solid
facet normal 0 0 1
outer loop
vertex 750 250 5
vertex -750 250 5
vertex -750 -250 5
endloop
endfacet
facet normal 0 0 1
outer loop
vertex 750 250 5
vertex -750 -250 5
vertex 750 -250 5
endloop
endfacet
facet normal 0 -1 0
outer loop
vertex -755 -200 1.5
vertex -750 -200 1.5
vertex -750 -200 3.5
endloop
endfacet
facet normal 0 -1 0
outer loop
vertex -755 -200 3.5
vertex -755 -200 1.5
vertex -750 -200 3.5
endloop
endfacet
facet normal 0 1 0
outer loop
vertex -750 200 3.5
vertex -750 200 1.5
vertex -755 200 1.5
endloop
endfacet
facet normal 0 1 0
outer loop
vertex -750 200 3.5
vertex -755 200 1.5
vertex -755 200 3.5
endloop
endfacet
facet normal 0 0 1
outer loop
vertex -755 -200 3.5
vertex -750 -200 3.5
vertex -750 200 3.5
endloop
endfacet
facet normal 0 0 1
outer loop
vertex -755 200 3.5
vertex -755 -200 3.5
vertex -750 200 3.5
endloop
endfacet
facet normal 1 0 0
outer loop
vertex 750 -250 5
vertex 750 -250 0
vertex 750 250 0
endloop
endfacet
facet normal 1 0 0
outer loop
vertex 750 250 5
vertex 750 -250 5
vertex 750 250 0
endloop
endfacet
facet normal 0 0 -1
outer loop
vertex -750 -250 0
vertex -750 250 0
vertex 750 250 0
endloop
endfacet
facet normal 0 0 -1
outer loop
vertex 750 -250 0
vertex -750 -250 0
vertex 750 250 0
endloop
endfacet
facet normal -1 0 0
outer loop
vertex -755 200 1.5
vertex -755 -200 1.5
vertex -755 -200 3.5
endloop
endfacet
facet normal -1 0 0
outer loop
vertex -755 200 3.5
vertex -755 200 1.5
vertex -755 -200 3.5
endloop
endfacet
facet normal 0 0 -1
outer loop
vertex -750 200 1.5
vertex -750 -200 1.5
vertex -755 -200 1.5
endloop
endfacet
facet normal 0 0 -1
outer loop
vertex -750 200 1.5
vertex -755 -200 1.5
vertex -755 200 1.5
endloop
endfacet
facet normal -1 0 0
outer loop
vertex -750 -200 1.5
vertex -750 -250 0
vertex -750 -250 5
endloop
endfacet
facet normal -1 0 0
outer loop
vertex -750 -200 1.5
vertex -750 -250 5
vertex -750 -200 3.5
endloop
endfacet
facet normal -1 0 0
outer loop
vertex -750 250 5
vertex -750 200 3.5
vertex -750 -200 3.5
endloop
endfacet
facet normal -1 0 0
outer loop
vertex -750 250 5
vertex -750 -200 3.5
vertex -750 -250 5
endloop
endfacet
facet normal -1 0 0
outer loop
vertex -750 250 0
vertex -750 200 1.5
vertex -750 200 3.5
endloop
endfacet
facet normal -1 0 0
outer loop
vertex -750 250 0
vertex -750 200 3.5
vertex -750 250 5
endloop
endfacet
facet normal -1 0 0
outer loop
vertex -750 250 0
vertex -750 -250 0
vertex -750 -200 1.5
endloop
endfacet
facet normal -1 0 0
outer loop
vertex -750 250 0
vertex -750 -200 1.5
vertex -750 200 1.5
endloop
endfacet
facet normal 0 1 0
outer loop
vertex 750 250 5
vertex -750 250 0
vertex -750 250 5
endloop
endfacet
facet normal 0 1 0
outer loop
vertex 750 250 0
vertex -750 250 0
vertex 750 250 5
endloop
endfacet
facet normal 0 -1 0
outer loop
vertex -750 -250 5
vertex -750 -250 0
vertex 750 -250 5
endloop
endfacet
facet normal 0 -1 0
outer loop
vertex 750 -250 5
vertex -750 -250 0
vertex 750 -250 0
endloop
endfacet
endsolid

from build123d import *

# Parameters (mm, degrees)
SCHIZZO1_W                   = 1500
SCHIZZO1_H                   = 500
ESTRUSIONE_ESTRUSIONE1_DEPTH = 5
SCHIZZO2_W                   = 2
SCHIZZO2_H                   = 400
ESTRUSIONE_ESTRUSIONE2_DEPTH = 5


with BuildPart() as part:
    # Schizzo1 → Estrusione-Estrusione1 (new body)
    with BuildSketch(Plane.XY):
        Rectangle(SCHIZZO1_W, SCHIZZO1_H)
    extrude(amount=ESTRUSIONE_ESTRUSIONE1_DEPTH)

    # Schizzo2 → Estrusione-Estrusione2 (add)
    with BuildSketch(Plane.ZY.offset(750)):
        with Locations((2.5, 0)):
            Rectangle(SCHIZZO2_W, SCHIZZO2_H)
    extrude(amount=ESTRUSIONE_ESTRUSIONE2_DEPTH)


solid = part.part
